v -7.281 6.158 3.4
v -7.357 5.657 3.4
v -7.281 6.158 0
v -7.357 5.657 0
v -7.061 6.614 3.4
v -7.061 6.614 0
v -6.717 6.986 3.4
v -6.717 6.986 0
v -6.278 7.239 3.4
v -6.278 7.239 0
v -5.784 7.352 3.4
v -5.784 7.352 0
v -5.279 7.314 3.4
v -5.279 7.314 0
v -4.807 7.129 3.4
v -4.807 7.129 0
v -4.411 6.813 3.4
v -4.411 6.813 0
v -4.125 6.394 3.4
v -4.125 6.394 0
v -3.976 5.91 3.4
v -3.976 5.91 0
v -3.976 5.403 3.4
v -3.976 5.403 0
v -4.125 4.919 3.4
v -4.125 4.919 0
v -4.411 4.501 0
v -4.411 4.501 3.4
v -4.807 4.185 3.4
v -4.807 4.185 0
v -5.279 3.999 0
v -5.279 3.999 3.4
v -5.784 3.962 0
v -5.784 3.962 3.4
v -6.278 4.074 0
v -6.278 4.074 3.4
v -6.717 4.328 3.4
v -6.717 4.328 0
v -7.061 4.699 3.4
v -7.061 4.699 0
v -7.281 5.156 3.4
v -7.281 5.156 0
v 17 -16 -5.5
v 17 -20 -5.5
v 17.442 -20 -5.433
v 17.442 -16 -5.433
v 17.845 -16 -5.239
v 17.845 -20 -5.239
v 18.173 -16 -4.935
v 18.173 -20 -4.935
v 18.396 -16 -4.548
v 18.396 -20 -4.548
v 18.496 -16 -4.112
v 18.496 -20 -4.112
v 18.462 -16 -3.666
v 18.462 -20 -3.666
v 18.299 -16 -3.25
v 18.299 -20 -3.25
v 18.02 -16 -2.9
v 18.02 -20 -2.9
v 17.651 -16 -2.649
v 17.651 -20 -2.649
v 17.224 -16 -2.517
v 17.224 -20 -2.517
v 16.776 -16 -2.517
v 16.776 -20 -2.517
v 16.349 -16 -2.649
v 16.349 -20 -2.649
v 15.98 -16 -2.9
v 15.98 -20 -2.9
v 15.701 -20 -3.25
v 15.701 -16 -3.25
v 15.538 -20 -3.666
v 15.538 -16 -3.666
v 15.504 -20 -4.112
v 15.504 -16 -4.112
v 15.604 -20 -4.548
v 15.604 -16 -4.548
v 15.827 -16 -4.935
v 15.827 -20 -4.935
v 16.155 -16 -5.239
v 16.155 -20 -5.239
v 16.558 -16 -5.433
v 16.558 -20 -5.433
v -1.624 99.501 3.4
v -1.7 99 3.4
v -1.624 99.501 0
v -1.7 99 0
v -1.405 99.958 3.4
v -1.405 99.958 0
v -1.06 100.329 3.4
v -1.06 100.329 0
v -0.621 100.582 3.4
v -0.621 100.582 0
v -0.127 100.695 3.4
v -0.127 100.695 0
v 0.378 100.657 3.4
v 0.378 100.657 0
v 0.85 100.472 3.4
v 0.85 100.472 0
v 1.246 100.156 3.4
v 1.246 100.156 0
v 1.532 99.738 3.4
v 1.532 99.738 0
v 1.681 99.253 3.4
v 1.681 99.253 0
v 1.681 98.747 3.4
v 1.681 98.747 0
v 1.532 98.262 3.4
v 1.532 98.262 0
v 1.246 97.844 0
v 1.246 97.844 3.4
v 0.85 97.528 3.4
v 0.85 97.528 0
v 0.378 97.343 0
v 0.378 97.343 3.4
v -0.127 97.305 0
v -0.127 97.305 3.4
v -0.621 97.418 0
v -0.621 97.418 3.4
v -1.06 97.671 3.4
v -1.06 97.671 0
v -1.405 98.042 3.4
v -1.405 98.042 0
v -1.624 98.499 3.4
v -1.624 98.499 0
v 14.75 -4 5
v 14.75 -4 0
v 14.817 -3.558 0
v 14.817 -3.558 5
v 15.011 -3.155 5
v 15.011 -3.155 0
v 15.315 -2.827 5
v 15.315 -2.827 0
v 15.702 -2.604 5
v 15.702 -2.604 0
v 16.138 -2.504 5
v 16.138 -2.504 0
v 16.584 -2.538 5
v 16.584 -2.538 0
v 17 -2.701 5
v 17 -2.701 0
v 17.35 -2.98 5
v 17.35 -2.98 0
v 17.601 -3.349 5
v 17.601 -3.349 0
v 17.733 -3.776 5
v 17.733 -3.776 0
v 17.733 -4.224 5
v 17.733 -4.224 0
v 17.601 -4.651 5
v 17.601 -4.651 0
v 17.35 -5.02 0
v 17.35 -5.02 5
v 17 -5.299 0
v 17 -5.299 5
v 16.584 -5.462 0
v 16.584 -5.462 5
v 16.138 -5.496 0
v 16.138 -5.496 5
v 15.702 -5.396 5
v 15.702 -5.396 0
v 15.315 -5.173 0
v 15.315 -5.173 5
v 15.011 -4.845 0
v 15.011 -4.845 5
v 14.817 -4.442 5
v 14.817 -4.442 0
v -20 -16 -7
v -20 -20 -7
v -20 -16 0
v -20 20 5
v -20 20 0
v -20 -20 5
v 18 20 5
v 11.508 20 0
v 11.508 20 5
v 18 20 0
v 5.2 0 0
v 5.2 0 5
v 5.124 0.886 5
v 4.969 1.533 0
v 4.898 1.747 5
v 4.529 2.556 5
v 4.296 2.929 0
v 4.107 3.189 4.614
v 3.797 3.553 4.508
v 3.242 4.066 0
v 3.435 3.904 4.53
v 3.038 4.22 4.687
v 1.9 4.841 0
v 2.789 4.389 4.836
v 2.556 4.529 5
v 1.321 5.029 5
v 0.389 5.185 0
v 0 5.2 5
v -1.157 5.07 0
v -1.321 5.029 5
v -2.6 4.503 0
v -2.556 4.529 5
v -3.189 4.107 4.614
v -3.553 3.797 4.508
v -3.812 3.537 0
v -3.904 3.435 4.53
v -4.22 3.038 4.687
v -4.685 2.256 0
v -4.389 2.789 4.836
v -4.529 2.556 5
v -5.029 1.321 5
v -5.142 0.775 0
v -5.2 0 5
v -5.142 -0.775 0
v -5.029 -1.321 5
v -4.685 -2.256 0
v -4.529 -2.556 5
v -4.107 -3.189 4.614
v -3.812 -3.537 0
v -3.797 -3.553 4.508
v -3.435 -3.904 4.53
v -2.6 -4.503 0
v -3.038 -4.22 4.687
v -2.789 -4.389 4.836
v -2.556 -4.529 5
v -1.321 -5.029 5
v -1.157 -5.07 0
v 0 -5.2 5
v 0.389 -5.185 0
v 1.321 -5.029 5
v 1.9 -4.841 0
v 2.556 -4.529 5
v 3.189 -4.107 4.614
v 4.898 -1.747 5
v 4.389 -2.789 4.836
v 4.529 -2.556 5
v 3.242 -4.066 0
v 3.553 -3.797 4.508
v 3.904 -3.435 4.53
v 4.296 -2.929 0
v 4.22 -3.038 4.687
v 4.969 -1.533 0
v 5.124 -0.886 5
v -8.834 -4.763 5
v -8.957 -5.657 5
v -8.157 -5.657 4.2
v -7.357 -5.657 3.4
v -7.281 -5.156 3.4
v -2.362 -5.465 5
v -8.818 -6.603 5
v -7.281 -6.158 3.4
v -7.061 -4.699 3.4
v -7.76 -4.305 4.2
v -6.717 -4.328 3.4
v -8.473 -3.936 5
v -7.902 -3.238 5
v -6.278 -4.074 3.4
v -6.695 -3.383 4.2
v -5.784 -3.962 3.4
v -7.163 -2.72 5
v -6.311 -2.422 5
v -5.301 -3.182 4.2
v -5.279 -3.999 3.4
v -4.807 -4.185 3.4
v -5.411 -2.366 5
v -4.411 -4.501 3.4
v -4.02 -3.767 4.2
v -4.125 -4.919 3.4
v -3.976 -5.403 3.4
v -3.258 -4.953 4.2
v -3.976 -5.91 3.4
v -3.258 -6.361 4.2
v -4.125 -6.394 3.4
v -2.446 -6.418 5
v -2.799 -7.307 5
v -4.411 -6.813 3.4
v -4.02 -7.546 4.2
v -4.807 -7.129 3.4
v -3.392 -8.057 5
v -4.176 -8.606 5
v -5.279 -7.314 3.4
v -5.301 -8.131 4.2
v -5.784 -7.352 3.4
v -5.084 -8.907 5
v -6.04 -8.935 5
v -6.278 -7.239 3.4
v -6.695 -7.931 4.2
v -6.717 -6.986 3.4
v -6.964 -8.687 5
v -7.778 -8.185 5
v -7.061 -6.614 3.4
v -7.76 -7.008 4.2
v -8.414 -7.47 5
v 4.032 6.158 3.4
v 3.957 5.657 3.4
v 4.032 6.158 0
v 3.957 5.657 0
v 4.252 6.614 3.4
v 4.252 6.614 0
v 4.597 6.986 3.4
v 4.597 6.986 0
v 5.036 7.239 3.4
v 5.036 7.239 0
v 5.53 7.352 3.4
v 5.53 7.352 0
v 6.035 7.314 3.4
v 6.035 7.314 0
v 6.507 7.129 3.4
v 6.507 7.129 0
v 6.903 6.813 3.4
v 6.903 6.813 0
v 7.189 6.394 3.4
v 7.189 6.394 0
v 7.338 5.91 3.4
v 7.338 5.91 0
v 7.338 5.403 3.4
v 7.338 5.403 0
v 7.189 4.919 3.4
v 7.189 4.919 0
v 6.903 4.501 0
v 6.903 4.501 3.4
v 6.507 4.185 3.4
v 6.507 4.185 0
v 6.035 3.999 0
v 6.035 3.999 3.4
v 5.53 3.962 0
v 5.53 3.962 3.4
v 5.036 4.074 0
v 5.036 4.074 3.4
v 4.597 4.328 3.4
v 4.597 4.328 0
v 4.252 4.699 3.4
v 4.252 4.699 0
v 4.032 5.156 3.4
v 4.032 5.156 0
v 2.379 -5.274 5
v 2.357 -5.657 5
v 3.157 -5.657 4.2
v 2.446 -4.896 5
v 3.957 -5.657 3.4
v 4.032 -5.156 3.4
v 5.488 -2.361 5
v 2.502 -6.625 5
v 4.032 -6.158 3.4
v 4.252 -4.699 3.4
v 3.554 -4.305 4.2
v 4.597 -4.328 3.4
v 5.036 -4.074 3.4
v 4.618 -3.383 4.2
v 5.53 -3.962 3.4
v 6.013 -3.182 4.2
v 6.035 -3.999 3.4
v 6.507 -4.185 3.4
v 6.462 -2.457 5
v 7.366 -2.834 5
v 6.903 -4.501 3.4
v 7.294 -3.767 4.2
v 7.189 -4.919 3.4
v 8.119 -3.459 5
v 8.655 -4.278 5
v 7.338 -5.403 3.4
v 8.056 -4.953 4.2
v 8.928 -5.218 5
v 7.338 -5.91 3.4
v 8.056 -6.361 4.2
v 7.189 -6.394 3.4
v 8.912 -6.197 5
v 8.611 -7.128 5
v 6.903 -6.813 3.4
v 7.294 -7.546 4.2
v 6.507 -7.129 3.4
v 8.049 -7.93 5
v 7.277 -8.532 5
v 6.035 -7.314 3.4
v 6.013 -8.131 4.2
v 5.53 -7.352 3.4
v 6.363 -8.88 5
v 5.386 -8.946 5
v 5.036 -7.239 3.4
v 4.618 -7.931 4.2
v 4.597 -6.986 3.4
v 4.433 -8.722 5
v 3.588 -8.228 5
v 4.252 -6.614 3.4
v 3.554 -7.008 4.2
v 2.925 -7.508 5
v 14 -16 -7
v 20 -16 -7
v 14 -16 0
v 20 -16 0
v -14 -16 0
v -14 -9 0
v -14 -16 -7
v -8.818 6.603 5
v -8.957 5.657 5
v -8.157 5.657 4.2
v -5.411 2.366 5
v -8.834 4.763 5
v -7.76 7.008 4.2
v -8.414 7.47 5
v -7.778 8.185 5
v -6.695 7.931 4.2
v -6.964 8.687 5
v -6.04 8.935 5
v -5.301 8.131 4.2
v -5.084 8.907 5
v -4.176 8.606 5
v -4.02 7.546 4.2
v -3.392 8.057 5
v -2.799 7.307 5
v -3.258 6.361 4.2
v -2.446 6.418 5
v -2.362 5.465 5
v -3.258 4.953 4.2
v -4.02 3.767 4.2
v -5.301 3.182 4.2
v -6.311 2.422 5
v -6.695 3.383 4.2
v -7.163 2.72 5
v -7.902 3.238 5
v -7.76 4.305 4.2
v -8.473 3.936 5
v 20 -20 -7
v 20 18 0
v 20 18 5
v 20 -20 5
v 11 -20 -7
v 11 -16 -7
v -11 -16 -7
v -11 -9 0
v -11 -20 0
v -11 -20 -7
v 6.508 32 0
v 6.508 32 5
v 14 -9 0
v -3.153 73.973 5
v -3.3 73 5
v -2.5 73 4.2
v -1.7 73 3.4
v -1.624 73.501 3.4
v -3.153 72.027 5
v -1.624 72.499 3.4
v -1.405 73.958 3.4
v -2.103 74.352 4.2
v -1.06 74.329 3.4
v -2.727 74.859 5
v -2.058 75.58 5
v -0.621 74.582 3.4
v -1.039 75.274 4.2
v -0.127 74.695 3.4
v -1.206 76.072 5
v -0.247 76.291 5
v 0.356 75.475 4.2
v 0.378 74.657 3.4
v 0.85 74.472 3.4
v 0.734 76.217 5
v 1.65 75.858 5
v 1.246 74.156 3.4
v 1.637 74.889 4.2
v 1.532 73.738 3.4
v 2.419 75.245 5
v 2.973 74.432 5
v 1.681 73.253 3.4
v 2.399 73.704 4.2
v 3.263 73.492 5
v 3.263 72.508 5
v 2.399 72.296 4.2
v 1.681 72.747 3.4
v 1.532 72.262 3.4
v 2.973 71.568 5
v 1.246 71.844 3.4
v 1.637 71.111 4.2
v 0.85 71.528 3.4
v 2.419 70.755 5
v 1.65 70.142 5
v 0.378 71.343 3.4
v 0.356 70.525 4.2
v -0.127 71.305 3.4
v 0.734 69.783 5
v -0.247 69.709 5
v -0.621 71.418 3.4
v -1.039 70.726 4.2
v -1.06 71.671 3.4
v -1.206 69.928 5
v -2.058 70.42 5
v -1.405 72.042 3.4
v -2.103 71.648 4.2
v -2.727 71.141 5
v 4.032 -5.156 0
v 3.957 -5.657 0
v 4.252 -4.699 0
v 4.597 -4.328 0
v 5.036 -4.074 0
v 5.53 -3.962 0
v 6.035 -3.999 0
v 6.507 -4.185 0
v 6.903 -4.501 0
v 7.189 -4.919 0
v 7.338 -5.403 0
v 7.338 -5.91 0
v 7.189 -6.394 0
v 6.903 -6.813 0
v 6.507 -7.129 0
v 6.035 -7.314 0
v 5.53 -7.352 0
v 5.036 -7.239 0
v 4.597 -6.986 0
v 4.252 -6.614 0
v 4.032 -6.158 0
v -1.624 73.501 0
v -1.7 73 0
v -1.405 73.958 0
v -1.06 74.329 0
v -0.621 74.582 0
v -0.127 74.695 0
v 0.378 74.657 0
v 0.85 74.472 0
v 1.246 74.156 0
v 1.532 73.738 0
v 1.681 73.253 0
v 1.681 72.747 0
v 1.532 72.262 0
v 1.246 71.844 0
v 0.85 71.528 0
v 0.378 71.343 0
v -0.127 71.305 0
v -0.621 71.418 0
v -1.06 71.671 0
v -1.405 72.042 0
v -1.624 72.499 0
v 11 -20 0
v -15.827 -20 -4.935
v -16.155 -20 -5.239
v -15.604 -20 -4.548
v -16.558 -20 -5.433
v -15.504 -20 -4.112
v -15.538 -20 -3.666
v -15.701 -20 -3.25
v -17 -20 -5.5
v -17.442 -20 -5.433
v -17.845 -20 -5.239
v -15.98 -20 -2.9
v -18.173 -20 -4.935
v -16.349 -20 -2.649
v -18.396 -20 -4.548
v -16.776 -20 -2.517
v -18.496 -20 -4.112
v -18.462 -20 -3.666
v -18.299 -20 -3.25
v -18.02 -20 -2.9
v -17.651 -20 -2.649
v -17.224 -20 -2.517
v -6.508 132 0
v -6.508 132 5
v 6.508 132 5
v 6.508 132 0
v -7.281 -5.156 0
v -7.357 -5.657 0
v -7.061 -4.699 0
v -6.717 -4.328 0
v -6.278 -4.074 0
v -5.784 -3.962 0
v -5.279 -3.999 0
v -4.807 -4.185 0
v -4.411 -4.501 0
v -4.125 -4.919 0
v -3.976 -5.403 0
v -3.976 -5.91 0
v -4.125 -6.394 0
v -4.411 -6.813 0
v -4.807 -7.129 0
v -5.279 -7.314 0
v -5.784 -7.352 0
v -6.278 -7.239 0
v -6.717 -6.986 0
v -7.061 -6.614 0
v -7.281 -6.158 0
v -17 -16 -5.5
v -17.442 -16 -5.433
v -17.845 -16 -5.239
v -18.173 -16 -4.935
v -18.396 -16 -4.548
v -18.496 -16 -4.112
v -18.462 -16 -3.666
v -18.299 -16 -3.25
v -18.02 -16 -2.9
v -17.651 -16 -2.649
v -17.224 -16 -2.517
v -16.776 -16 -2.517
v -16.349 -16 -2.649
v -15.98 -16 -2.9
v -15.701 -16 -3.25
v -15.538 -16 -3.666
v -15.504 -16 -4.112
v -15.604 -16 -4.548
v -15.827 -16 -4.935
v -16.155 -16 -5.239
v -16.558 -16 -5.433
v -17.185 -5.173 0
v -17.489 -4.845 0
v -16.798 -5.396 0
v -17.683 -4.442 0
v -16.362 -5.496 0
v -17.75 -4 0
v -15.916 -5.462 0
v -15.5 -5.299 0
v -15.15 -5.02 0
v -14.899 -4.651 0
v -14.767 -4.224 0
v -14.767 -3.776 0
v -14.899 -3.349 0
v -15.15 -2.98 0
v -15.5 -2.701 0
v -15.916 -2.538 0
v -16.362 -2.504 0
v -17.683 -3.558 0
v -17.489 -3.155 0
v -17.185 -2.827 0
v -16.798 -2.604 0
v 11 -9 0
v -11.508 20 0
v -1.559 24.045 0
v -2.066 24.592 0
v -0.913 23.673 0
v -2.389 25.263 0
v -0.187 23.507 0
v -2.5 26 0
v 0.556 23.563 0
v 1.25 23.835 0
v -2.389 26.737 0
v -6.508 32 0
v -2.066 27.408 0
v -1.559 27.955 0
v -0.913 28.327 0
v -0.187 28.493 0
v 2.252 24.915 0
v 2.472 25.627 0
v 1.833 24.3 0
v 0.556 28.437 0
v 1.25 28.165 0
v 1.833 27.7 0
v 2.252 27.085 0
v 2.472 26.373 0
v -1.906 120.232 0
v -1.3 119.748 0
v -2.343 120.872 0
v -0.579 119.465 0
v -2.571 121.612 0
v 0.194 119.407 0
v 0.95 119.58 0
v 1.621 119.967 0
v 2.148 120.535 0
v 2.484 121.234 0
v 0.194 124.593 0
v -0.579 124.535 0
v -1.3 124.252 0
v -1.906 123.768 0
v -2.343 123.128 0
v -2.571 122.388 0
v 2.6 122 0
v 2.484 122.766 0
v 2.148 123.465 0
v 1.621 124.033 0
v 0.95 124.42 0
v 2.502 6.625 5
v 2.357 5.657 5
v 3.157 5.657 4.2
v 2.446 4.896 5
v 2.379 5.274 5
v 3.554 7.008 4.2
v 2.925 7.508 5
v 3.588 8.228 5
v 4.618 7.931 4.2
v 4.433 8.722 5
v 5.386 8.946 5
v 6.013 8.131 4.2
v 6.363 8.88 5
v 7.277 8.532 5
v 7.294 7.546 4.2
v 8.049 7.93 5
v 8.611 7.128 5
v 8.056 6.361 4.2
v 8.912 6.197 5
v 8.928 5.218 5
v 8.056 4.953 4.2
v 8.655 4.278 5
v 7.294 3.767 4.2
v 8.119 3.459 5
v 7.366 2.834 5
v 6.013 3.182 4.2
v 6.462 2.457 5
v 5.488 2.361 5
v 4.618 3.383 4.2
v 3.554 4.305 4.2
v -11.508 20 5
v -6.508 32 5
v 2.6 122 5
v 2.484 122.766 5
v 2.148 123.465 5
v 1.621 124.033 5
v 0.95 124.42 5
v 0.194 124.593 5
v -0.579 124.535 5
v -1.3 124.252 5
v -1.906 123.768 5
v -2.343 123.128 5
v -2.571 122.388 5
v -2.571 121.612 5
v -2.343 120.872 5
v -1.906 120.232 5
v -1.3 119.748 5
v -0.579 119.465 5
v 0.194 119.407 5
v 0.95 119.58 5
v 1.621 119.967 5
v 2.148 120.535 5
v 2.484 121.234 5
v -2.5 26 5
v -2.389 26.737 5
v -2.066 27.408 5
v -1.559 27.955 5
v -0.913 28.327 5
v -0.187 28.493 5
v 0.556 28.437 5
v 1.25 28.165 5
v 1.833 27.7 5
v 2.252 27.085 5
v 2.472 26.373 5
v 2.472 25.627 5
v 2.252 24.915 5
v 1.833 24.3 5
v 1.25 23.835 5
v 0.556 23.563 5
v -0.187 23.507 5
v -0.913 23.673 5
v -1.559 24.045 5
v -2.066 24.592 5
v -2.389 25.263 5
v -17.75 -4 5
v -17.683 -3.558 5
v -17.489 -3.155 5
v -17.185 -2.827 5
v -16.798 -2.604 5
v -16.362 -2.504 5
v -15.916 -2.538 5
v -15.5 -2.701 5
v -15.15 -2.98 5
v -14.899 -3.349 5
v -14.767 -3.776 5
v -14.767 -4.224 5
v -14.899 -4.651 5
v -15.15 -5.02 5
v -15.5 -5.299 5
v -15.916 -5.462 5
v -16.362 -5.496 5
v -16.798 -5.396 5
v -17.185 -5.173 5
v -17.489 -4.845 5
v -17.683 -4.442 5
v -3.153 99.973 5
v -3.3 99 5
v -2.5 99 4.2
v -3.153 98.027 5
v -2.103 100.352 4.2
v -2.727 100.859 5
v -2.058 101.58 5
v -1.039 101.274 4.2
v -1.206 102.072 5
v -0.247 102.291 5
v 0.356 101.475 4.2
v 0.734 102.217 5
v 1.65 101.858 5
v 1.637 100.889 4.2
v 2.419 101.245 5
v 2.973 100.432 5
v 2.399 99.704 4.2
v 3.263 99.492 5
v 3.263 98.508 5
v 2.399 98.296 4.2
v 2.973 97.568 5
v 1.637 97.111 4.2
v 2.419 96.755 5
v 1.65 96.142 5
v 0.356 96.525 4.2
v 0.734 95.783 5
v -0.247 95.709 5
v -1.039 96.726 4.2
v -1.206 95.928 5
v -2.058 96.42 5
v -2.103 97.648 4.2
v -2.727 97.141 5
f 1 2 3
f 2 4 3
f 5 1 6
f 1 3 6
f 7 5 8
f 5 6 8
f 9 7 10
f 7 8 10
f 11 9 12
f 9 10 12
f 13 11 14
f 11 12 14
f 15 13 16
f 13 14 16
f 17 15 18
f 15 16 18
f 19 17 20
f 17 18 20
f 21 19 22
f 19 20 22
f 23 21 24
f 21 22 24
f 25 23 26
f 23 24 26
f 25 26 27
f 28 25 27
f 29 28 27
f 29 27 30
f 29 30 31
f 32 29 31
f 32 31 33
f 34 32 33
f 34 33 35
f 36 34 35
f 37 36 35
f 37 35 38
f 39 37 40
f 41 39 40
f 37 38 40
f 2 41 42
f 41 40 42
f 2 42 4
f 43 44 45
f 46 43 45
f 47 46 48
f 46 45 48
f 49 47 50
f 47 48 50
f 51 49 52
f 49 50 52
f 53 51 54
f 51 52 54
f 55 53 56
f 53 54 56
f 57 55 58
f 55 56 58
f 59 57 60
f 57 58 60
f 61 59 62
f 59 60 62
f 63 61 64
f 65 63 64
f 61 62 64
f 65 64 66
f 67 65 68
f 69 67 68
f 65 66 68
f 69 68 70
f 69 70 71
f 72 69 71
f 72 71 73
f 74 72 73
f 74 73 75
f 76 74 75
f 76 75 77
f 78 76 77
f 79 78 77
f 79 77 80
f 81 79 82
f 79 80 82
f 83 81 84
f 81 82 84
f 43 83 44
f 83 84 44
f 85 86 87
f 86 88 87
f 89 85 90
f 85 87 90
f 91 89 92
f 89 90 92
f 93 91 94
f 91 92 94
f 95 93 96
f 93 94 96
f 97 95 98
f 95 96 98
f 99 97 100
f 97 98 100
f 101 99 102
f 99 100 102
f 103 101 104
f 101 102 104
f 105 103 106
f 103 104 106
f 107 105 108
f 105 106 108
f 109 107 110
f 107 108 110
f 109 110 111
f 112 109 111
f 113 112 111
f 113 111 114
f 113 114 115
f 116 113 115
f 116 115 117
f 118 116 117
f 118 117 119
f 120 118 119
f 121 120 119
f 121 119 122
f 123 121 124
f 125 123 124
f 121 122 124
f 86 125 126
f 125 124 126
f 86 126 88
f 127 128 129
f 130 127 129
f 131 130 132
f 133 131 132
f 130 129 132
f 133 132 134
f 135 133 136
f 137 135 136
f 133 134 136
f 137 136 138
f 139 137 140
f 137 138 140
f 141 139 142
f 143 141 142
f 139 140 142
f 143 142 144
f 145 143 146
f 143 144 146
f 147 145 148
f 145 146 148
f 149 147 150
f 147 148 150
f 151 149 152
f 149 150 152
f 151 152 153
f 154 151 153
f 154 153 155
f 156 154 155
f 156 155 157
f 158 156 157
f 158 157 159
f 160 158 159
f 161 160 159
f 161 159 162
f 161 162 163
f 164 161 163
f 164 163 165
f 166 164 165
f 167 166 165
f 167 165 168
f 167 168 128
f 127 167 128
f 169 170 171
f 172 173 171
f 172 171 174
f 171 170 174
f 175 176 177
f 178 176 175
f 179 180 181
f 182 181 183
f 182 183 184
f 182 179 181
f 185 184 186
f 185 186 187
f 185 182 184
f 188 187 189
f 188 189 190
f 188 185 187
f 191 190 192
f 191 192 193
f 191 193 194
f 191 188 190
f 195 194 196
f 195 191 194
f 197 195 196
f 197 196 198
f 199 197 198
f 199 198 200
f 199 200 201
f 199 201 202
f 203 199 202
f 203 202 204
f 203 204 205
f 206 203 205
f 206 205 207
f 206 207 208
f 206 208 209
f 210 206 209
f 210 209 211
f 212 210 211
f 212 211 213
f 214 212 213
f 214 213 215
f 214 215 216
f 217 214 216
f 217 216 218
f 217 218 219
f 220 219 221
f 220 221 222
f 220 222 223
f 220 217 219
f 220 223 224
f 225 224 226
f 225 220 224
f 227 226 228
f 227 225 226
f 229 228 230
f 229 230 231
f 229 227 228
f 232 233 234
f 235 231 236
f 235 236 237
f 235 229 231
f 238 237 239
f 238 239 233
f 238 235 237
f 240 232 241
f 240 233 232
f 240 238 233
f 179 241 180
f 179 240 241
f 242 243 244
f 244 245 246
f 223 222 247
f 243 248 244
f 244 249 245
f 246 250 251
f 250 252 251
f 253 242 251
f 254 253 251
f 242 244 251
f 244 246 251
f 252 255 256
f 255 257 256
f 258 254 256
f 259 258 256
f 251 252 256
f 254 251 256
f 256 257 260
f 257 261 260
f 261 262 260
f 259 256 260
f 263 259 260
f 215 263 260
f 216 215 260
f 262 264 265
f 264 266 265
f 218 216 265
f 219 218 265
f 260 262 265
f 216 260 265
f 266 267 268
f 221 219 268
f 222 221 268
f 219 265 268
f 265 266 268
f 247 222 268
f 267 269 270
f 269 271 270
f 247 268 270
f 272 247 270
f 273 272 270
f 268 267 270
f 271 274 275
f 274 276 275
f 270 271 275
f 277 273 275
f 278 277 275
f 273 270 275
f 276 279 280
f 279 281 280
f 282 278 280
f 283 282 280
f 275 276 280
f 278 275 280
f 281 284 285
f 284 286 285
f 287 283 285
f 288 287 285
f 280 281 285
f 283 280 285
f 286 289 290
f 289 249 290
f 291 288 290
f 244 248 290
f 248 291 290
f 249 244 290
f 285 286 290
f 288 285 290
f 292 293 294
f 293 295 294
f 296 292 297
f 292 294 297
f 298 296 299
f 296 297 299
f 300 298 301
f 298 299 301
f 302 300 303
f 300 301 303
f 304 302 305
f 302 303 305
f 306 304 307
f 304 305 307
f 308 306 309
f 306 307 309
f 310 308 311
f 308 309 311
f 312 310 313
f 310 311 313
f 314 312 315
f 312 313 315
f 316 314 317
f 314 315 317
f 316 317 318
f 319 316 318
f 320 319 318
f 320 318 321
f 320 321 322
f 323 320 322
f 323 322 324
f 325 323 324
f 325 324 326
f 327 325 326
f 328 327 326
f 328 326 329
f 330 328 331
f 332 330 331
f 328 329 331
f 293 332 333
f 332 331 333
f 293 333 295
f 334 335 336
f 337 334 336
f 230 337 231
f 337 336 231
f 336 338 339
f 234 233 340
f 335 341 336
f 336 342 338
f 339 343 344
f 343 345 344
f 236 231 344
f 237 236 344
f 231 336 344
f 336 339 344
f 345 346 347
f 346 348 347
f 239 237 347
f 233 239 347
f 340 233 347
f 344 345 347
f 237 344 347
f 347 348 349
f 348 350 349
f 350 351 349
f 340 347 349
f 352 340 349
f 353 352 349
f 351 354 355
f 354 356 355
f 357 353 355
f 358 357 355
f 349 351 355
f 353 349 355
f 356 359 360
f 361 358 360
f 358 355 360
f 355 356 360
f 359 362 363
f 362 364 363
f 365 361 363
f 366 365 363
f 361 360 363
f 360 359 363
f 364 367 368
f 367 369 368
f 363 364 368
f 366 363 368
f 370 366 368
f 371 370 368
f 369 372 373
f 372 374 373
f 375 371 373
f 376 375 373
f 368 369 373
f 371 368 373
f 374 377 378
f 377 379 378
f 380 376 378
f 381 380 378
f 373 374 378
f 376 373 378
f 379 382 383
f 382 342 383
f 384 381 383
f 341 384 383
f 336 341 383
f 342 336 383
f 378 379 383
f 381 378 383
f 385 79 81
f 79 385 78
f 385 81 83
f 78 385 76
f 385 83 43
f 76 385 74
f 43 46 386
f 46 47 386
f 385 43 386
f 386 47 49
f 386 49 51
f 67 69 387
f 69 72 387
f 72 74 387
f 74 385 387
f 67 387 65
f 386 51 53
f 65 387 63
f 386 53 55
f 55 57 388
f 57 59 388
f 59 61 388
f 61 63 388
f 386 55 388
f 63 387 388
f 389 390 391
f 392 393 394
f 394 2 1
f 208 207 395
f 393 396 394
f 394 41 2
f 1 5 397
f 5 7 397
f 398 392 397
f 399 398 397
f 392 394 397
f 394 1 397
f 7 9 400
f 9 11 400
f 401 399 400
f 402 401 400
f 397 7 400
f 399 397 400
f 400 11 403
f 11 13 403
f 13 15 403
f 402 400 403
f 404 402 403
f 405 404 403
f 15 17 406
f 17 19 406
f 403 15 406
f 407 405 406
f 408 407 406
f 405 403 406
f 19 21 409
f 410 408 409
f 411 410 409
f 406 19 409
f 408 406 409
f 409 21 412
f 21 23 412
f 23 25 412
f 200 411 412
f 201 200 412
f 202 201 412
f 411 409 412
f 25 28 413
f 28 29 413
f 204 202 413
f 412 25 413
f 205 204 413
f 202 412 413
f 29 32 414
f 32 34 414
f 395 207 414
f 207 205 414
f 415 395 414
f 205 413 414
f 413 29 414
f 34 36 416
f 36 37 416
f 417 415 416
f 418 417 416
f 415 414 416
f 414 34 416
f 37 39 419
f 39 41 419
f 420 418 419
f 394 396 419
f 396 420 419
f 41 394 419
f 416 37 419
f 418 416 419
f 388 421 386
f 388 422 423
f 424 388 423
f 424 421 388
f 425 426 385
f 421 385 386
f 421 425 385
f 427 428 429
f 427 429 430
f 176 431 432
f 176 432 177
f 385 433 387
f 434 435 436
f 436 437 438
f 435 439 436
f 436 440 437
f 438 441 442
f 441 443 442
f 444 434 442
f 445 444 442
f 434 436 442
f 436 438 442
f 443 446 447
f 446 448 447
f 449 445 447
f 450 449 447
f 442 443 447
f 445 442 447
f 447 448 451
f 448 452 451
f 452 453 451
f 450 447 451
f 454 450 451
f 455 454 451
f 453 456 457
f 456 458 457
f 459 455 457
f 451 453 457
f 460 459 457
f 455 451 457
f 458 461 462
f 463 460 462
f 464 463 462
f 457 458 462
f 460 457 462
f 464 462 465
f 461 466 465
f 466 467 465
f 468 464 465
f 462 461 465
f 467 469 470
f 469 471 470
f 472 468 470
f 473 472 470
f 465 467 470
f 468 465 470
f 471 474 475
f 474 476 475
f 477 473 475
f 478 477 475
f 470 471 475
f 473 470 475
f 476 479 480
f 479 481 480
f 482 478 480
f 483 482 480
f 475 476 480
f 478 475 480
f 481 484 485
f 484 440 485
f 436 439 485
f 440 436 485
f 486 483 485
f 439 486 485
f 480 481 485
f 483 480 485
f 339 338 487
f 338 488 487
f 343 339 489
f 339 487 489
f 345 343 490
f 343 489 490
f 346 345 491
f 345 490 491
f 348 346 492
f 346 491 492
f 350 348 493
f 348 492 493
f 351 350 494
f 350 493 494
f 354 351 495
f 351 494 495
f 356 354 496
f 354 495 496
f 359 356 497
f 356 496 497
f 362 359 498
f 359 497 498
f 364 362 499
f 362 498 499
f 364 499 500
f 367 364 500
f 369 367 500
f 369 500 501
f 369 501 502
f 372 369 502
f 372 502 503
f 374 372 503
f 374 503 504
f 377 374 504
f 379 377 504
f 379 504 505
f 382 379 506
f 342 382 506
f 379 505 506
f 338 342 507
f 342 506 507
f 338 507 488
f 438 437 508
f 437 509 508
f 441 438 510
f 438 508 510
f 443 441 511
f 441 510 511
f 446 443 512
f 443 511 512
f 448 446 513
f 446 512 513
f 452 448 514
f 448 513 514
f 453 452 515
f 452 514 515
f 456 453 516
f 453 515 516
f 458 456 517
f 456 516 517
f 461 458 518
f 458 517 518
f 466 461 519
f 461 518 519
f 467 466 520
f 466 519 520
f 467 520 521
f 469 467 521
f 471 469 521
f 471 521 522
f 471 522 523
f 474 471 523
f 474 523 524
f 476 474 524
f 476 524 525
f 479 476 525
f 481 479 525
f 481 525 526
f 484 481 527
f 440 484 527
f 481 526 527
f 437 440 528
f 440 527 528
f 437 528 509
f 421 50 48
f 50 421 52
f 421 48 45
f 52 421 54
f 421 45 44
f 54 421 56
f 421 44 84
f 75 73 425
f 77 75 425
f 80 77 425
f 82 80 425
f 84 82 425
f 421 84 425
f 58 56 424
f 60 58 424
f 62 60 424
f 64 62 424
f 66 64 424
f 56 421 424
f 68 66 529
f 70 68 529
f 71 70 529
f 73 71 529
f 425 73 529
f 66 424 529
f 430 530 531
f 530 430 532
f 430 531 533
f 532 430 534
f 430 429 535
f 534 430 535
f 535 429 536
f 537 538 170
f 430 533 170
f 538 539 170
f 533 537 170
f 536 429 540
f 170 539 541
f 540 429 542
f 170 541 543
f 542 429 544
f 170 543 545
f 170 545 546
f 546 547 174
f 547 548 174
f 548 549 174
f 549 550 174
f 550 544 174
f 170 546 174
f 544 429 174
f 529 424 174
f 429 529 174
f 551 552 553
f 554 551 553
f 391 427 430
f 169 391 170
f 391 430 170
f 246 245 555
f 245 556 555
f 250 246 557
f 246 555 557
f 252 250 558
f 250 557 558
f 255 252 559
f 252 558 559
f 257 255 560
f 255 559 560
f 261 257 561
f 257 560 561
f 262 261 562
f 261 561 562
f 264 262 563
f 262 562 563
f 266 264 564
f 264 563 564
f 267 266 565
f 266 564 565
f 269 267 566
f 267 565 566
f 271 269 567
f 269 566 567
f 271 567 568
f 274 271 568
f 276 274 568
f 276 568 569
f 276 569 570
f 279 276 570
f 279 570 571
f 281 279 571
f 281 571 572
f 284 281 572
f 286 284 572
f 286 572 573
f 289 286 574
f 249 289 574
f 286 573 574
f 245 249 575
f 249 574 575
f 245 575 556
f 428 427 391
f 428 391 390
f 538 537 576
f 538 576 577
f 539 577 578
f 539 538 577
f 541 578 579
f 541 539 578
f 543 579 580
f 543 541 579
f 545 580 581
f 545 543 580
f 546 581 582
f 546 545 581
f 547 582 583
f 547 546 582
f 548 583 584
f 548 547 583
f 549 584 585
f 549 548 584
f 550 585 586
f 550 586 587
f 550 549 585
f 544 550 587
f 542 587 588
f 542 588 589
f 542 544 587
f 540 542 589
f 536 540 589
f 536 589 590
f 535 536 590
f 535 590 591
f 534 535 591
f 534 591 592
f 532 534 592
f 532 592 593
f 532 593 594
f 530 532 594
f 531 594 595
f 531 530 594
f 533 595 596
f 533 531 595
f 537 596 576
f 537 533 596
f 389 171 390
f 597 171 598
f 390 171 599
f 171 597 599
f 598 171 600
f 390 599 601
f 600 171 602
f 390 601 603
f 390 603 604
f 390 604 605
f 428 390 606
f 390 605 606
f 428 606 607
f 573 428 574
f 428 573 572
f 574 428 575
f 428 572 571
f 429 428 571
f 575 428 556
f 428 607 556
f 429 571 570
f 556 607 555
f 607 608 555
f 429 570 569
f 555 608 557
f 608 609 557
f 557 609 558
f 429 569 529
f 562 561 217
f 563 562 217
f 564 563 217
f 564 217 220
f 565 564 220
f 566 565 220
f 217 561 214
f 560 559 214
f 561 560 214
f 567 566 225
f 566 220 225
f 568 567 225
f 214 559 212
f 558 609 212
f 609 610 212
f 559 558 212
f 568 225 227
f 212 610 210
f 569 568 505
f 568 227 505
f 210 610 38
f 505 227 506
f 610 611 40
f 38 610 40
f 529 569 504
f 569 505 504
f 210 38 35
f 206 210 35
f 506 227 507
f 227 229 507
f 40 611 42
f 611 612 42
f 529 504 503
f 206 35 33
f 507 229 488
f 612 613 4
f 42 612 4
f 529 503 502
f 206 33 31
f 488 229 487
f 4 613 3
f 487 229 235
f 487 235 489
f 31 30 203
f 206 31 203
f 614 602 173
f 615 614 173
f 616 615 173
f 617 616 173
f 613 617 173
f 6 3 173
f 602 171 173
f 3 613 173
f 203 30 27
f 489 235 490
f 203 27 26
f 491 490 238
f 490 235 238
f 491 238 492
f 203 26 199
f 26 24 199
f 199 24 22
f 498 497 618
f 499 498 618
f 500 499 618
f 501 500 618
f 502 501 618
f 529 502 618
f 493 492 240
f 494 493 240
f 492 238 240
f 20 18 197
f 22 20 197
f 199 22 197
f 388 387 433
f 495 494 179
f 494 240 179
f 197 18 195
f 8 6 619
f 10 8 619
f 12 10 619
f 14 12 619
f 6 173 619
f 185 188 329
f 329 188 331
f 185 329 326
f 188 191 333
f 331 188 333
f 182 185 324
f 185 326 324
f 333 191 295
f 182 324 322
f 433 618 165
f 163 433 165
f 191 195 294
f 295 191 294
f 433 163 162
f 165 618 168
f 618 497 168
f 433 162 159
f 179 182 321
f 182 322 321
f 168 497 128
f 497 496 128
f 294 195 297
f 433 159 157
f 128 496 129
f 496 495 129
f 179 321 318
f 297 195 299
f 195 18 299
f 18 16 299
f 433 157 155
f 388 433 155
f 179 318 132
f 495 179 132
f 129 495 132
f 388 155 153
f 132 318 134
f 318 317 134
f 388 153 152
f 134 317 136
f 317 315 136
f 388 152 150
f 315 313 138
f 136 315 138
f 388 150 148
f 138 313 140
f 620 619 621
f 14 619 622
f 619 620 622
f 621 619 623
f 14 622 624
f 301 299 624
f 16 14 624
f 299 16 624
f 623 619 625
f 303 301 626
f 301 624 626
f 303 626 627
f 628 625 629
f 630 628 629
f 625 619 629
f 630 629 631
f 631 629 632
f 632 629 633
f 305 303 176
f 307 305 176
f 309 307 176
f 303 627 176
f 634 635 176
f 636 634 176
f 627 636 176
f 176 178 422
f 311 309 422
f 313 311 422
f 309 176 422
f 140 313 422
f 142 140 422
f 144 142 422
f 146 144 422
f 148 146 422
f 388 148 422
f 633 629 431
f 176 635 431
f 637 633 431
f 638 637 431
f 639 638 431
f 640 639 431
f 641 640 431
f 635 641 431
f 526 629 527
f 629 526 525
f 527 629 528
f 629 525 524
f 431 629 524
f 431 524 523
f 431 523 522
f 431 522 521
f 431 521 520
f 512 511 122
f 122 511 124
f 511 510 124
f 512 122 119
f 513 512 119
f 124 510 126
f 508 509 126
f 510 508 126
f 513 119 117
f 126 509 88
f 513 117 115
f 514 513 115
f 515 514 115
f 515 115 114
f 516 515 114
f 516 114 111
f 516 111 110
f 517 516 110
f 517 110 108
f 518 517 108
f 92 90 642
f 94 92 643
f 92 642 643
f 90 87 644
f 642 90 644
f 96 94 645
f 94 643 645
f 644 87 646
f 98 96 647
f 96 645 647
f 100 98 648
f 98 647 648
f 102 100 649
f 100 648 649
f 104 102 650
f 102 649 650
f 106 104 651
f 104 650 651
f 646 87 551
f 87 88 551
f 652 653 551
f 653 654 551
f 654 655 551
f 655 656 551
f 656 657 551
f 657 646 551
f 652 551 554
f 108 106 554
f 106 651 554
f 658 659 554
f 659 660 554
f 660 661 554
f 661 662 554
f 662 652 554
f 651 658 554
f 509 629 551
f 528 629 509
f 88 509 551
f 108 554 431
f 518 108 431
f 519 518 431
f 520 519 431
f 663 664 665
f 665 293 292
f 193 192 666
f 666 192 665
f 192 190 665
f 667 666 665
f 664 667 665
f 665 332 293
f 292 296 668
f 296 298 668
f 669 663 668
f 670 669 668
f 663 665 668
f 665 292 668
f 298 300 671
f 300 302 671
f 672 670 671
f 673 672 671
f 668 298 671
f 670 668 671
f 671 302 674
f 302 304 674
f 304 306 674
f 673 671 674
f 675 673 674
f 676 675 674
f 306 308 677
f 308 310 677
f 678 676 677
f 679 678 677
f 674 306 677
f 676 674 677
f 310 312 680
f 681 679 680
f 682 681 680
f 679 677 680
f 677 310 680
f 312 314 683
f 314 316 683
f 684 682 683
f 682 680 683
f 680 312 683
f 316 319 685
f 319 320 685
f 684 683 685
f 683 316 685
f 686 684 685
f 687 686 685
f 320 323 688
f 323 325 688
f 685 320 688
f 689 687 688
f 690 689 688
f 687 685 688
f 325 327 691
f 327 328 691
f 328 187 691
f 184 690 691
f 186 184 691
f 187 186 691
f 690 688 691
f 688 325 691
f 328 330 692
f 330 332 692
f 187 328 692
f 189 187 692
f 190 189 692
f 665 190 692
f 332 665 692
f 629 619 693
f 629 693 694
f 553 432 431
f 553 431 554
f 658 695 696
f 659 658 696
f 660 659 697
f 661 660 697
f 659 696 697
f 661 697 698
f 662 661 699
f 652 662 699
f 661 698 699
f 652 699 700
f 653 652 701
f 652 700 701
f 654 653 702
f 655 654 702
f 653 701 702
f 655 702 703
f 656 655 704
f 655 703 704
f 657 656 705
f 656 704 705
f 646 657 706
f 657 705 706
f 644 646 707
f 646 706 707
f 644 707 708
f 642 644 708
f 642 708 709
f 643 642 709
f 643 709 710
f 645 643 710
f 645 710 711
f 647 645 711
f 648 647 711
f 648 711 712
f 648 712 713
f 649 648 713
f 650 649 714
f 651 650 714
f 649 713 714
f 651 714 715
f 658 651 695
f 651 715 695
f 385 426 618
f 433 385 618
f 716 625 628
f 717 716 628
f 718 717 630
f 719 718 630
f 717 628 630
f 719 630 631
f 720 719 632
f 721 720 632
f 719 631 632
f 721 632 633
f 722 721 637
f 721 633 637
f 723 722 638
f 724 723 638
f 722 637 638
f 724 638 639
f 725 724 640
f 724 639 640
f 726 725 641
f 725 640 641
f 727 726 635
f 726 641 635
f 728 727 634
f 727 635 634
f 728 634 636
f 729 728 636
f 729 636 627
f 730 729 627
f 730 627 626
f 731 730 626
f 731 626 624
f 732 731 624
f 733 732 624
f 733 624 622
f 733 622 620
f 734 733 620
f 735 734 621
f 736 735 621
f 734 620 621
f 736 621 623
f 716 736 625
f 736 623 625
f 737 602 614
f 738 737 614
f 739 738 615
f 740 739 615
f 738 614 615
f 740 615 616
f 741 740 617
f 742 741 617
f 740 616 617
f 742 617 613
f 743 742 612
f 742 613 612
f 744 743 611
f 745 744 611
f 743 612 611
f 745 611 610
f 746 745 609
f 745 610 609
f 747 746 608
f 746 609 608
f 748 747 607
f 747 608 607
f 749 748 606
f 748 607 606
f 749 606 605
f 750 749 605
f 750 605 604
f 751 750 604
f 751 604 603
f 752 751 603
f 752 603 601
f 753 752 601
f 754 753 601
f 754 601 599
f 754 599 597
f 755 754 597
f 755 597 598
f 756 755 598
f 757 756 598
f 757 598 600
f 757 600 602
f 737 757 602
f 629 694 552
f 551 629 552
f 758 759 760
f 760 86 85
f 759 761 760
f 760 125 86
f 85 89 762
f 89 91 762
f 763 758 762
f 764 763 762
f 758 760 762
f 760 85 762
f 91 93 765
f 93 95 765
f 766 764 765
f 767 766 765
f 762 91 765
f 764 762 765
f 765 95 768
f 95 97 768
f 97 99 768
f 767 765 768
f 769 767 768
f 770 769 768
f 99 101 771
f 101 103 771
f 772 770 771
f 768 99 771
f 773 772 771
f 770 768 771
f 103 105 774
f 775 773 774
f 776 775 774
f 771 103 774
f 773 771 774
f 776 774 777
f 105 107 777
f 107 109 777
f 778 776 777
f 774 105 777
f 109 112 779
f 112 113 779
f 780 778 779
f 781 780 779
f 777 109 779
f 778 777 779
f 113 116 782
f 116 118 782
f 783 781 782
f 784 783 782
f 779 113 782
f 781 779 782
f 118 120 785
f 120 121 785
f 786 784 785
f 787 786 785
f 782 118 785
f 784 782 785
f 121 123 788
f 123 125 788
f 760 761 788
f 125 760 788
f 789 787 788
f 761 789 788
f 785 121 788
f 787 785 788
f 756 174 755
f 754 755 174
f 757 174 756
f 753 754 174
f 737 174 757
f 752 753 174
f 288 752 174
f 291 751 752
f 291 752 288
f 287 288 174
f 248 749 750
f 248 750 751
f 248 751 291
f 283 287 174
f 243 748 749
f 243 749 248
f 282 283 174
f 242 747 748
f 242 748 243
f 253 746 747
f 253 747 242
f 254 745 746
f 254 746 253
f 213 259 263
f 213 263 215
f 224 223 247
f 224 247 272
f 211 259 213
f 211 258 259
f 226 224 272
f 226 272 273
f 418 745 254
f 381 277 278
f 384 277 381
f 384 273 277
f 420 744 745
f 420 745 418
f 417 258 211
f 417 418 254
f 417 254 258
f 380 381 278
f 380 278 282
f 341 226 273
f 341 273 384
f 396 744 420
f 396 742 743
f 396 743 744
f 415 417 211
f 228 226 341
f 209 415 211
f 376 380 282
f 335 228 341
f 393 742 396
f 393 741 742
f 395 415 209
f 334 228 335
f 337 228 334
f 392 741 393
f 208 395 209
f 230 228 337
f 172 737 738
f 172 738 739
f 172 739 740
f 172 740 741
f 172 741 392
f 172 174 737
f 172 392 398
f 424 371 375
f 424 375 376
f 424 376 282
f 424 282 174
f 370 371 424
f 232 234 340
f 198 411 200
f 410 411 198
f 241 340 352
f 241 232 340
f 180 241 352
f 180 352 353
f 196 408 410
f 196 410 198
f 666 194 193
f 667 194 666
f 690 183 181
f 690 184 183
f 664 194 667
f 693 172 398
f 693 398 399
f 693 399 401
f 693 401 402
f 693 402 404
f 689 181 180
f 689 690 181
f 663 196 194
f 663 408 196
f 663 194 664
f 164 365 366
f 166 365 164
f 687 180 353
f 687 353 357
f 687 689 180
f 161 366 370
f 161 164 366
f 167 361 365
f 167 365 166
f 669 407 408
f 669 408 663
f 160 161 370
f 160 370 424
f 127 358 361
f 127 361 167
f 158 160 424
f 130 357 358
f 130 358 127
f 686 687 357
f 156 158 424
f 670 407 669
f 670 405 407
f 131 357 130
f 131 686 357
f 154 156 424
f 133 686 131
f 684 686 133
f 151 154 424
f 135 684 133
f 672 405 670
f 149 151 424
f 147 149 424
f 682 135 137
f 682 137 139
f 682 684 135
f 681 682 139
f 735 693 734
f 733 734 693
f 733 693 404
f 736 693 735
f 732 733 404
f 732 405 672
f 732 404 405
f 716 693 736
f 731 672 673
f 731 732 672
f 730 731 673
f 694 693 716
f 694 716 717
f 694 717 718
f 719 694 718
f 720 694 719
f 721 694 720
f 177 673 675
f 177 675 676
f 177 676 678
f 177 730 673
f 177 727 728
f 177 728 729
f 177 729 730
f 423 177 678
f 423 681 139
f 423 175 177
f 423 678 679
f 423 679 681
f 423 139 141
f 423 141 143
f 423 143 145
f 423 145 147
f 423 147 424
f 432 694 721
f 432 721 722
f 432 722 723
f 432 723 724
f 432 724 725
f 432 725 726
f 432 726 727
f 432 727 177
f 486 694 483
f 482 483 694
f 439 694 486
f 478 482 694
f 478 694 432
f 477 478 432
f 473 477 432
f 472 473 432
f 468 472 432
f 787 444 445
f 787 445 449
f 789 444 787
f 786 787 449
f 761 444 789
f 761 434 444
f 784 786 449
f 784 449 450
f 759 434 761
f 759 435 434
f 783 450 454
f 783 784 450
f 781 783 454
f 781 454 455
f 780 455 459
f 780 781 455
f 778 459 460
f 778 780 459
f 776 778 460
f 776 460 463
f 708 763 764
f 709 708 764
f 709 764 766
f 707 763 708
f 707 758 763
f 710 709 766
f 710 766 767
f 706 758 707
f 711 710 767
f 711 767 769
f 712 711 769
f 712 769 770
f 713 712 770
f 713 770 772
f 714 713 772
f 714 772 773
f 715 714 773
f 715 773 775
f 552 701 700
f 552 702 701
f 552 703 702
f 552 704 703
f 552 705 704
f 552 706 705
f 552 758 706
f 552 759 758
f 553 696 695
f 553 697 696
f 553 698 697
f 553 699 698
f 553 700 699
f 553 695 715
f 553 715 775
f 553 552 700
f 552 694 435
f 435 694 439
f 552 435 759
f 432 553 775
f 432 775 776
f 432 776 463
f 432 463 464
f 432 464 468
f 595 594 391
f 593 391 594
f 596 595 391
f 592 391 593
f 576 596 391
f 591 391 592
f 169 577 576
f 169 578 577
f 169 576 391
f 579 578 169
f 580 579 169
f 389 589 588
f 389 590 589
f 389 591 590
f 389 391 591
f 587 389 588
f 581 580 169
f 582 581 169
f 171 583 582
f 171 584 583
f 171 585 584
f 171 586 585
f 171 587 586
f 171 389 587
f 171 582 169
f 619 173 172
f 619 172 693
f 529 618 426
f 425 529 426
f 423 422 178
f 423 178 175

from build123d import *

# Parameters (mm, degrees)
SKETCH_1_W                   = 40
SKETCH_1_H                   = 40
SKETCH_1_R                   = 5.2
SKETCH_1_R_2                 = 1.6
EXTRUDE_1_DEPTH              = 5
HOLE_WIZARD_1_D              = 3
CHAMFER_1_SIZE               = 2
HOLE_WIZARD_M3_2_D           = 3.4
HOLE_WIZARD_M3_2_CSINK_D     = 6.6
HOLE_WIZARD_M3_2_CSINK_ANGLE = 90
SKETCH_7_R                   = 2.5
EXTRUDE_2_DEPTH              = 5
SKETCH_10_W                  = 9
SKETCH_10_H                  = 7
SKETCH_10_R                  = 1.5
EXTRUDE_4_DEPTH              = 4
EXTRUDE_6_DEPTH              = 3
SKETCH_13_W                  = 13.015545452
SKETCH_13_H                  = 100
SKETCH_13_R                  = 2.6
SKETCH_13_R_2                = 1.5
EXTRUDE_7_DEPTH              = 5
HOLE_WIZARD_M3_3_D           = 3.4
HOLE_WIZARD_M3_3_CSINK_D     = 6.6
HOLE_WIZARD_M3_3_CSINK_ANGLE = 90


with BuildPart() as part:
    # 草图1 → 凸台-拉伸1 (new body)
    with BuildSketch(Plane.XY):
        Rectangle(SKETCH_1_W, SKETCH_1_H)
        Circle(SKETCH_1_R, mode=Mode.SUBTRACT)
        with Locations((5.656854249, 5.656854249)):
            Circle(SKETCH_1_R_2, mode=Mode.SUBTRACT)
        with Locations((5.656854249, -5.656854249)):
            Circle(SKETCH_1_R_2, mode=Mode.SUBTRACT)
        with Locations((-5.656854249, -5.656854249)):
            Circle(SKETCH_1_R_2, mode=Mode.SUBTRACT)
        with Locations((-5.656854249, 5.656854249)):
            Circle(SKETCH_1_R_2, mode=Mode.SUBTRACT)
    extrude(amount=EXTRUDE_1_DEPTH)

    # 孔1 (through all)
    with Locations(Plane(origin=(16.25, -4, 5), x_dir=(1, 0, 0), z_dir=(0, 0, 1))):
        with Locations((0, 0), (-32.5, 0)):
            Hole(HOLE_WIZARD_1_D / 2)

    # 倒角1
    chamfer_1_edges = [part.edges().sort_by_distance(p)[0] for p in [
        (20, 20, 2.5),
    ]]
    chamfer(chamfer_1_edges, length=CHAMFER_1_SIZE)

    # M3 十字槽沉头木螺钉的锥形沉头孔2 (through all)
    with Locations(Plane.XY.offset(5)):
        with Locations((-5.656854249, 5.656854249), (5.656854249, 5.656854249), (5.656854249, -5.656854249), (-5.656854249, -5.656854249)):
            CounterSinkHole(HOLE_WIZARD_M3_2_D / 2, HOLE_WIZARD_M3_2_CSINK_D / 2, counter_sink_angle=HOLE_WIZARD_M3_2_CSINK_ANGLE)

    # 草图7 → 凸台-拉伸2 (add)
    with BuildSketch(Plane(origin=(0, 0, 0), x_dir=(-1, 0, 0), z_dir=(0, 0, -1))):
        Polygon((-11.507772726, 20), (-6.507772726, 20), (6.507772726, 20), (11.507772726, 20), (6.507772726, 32), (-6.507772726, 32), align=None)
        with Locations((0, 26)):
            Circle(SKETCH_7_R, mode=Mode.SUBTRACT)
    extrude(amount=-EXTRUDE_2_DEPTH)

    # 草图10 → 凸台-拉伸4 (add)
    with BuildSketch(Plane.XZ.offset(20)):
        with Locations((15.5, -3.5)):
            Rectangle(SKETCH_10_W, SKETCH_10_H)
        with Locations(Location((17, -4, 0), (0, 0, 270))):
            Circle(SKETCH_10_R, mode=Mode.SUBTRACT)
    extrude_4 = extrude(amount=-EXTRUDE_4_DEPTH)

    # 草图12 → 凸台-拉伸6 (add)
    with BuildSketch(Plane.ZY.offset(-11)):
        Polygon((-7, -16), (0, -9), (0, -16), align=None)
    extrude_6 = extrude(amount=-EXTRUDE_6_DEPTH)

    # 镜向2: 凸台-拉伸4, 凸台-拉伸6 across plane
    add(extrude_4.mirror(Plane(origin=(0, 0, 0), x_dir=(0, 0, 1), z_dir=(1, 0, 0))))
    add(extrude_6.mirror(Plane(origin=(0, 0, 0), x_dir=(0, 0, 1), z_dir=(1, 0, 0))))

    # 草图13 → 凸台-拉伸7 (add)
    with BuildSketch(Plane.XY.offset(5)):
        with Locations((0, 82)):
            Rectangle(SKETCH_13_W, SKETCH_13_H)
        with Locations((0, 122)):
            Circle(SKETCH_13_R, mode=Mode.SUBTRACT)
        with Locations((0, 99)):
            Circle(SKETCH_13_R_2, mode=Mode.SUBTRACT)
        with Locations((0, 73)):
            Circle(SKETCH_13_R_2, mode=Mode.SUBTRACT)
    extrude(amount=-EXTRUDE_7_DEPTH)

    # M3 十字槽沉头木螺钉的锥形沉头孔3 (through all)
    with Locations(Plane.XY.offset(5)):
        with Locations((0, 99), (0, 73)):
            CounterSinkHole(HOLE_WIZARD_M3_3_D / 2, HOLE_WIZARD_M3_3_CSINK_D / 2, counter_sink_angle=HOLE_WIZARD_M3_3_CSINK_ANGLE)


solid = part.part
